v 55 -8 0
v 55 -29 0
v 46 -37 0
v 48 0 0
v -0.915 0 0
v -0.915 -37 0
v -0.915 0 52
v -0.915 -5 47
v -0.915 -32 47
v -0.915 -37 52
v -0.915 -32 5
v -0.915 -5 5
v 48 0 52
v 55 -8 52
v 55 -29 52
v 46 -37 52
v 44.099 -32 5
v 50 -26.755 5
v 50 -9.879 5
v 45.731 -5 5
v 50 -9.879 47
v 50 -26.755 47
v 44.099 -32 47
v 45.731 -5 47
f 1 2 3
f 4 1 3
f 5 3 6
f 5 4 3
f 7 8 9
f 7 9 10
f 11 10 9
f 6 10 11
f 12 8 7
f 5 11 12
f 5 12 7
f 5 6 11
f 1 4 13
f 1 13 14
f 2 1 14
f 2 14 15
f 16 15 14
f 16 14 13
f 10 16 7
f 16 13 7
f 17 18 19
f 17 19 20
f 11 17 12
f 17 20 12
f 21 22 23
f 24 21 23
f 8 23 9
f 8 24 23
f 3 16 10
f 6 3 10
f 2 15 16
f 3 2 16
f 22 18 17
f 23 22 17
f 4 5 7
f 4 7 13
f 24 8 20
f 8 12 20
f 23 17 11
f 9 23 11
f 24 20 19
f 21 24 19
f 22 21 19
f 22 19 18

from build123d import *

# Parameters (mm, degrees)
CLOSING_LIP_PROFILE_DEPTH = 52
SHELL_1_T                 = -5


with BuildPart() as part:
    # 草图1 → Closing_lip_profile (new body)
    with BuildSketch(Plane.XY):
        Polygon((-0.915165953, 0), (48, 0), (55, -8), (55, -29), (46, -37), (-0.915165953, -37), align=None)
    extrude(amount=CLOSING_LIP_PROFILE_DEPTH)

    # 抽壳1
    shell_1_openings = [part.faces().sort_by_distance(p)[0] for p in [
        (-0.915165953, -18.5, 26),
    ]]
    offset(amount=SHELL_1_T, openings=shell_1_openings, kind=Kind.INTERSECTION)


solid = part.part
